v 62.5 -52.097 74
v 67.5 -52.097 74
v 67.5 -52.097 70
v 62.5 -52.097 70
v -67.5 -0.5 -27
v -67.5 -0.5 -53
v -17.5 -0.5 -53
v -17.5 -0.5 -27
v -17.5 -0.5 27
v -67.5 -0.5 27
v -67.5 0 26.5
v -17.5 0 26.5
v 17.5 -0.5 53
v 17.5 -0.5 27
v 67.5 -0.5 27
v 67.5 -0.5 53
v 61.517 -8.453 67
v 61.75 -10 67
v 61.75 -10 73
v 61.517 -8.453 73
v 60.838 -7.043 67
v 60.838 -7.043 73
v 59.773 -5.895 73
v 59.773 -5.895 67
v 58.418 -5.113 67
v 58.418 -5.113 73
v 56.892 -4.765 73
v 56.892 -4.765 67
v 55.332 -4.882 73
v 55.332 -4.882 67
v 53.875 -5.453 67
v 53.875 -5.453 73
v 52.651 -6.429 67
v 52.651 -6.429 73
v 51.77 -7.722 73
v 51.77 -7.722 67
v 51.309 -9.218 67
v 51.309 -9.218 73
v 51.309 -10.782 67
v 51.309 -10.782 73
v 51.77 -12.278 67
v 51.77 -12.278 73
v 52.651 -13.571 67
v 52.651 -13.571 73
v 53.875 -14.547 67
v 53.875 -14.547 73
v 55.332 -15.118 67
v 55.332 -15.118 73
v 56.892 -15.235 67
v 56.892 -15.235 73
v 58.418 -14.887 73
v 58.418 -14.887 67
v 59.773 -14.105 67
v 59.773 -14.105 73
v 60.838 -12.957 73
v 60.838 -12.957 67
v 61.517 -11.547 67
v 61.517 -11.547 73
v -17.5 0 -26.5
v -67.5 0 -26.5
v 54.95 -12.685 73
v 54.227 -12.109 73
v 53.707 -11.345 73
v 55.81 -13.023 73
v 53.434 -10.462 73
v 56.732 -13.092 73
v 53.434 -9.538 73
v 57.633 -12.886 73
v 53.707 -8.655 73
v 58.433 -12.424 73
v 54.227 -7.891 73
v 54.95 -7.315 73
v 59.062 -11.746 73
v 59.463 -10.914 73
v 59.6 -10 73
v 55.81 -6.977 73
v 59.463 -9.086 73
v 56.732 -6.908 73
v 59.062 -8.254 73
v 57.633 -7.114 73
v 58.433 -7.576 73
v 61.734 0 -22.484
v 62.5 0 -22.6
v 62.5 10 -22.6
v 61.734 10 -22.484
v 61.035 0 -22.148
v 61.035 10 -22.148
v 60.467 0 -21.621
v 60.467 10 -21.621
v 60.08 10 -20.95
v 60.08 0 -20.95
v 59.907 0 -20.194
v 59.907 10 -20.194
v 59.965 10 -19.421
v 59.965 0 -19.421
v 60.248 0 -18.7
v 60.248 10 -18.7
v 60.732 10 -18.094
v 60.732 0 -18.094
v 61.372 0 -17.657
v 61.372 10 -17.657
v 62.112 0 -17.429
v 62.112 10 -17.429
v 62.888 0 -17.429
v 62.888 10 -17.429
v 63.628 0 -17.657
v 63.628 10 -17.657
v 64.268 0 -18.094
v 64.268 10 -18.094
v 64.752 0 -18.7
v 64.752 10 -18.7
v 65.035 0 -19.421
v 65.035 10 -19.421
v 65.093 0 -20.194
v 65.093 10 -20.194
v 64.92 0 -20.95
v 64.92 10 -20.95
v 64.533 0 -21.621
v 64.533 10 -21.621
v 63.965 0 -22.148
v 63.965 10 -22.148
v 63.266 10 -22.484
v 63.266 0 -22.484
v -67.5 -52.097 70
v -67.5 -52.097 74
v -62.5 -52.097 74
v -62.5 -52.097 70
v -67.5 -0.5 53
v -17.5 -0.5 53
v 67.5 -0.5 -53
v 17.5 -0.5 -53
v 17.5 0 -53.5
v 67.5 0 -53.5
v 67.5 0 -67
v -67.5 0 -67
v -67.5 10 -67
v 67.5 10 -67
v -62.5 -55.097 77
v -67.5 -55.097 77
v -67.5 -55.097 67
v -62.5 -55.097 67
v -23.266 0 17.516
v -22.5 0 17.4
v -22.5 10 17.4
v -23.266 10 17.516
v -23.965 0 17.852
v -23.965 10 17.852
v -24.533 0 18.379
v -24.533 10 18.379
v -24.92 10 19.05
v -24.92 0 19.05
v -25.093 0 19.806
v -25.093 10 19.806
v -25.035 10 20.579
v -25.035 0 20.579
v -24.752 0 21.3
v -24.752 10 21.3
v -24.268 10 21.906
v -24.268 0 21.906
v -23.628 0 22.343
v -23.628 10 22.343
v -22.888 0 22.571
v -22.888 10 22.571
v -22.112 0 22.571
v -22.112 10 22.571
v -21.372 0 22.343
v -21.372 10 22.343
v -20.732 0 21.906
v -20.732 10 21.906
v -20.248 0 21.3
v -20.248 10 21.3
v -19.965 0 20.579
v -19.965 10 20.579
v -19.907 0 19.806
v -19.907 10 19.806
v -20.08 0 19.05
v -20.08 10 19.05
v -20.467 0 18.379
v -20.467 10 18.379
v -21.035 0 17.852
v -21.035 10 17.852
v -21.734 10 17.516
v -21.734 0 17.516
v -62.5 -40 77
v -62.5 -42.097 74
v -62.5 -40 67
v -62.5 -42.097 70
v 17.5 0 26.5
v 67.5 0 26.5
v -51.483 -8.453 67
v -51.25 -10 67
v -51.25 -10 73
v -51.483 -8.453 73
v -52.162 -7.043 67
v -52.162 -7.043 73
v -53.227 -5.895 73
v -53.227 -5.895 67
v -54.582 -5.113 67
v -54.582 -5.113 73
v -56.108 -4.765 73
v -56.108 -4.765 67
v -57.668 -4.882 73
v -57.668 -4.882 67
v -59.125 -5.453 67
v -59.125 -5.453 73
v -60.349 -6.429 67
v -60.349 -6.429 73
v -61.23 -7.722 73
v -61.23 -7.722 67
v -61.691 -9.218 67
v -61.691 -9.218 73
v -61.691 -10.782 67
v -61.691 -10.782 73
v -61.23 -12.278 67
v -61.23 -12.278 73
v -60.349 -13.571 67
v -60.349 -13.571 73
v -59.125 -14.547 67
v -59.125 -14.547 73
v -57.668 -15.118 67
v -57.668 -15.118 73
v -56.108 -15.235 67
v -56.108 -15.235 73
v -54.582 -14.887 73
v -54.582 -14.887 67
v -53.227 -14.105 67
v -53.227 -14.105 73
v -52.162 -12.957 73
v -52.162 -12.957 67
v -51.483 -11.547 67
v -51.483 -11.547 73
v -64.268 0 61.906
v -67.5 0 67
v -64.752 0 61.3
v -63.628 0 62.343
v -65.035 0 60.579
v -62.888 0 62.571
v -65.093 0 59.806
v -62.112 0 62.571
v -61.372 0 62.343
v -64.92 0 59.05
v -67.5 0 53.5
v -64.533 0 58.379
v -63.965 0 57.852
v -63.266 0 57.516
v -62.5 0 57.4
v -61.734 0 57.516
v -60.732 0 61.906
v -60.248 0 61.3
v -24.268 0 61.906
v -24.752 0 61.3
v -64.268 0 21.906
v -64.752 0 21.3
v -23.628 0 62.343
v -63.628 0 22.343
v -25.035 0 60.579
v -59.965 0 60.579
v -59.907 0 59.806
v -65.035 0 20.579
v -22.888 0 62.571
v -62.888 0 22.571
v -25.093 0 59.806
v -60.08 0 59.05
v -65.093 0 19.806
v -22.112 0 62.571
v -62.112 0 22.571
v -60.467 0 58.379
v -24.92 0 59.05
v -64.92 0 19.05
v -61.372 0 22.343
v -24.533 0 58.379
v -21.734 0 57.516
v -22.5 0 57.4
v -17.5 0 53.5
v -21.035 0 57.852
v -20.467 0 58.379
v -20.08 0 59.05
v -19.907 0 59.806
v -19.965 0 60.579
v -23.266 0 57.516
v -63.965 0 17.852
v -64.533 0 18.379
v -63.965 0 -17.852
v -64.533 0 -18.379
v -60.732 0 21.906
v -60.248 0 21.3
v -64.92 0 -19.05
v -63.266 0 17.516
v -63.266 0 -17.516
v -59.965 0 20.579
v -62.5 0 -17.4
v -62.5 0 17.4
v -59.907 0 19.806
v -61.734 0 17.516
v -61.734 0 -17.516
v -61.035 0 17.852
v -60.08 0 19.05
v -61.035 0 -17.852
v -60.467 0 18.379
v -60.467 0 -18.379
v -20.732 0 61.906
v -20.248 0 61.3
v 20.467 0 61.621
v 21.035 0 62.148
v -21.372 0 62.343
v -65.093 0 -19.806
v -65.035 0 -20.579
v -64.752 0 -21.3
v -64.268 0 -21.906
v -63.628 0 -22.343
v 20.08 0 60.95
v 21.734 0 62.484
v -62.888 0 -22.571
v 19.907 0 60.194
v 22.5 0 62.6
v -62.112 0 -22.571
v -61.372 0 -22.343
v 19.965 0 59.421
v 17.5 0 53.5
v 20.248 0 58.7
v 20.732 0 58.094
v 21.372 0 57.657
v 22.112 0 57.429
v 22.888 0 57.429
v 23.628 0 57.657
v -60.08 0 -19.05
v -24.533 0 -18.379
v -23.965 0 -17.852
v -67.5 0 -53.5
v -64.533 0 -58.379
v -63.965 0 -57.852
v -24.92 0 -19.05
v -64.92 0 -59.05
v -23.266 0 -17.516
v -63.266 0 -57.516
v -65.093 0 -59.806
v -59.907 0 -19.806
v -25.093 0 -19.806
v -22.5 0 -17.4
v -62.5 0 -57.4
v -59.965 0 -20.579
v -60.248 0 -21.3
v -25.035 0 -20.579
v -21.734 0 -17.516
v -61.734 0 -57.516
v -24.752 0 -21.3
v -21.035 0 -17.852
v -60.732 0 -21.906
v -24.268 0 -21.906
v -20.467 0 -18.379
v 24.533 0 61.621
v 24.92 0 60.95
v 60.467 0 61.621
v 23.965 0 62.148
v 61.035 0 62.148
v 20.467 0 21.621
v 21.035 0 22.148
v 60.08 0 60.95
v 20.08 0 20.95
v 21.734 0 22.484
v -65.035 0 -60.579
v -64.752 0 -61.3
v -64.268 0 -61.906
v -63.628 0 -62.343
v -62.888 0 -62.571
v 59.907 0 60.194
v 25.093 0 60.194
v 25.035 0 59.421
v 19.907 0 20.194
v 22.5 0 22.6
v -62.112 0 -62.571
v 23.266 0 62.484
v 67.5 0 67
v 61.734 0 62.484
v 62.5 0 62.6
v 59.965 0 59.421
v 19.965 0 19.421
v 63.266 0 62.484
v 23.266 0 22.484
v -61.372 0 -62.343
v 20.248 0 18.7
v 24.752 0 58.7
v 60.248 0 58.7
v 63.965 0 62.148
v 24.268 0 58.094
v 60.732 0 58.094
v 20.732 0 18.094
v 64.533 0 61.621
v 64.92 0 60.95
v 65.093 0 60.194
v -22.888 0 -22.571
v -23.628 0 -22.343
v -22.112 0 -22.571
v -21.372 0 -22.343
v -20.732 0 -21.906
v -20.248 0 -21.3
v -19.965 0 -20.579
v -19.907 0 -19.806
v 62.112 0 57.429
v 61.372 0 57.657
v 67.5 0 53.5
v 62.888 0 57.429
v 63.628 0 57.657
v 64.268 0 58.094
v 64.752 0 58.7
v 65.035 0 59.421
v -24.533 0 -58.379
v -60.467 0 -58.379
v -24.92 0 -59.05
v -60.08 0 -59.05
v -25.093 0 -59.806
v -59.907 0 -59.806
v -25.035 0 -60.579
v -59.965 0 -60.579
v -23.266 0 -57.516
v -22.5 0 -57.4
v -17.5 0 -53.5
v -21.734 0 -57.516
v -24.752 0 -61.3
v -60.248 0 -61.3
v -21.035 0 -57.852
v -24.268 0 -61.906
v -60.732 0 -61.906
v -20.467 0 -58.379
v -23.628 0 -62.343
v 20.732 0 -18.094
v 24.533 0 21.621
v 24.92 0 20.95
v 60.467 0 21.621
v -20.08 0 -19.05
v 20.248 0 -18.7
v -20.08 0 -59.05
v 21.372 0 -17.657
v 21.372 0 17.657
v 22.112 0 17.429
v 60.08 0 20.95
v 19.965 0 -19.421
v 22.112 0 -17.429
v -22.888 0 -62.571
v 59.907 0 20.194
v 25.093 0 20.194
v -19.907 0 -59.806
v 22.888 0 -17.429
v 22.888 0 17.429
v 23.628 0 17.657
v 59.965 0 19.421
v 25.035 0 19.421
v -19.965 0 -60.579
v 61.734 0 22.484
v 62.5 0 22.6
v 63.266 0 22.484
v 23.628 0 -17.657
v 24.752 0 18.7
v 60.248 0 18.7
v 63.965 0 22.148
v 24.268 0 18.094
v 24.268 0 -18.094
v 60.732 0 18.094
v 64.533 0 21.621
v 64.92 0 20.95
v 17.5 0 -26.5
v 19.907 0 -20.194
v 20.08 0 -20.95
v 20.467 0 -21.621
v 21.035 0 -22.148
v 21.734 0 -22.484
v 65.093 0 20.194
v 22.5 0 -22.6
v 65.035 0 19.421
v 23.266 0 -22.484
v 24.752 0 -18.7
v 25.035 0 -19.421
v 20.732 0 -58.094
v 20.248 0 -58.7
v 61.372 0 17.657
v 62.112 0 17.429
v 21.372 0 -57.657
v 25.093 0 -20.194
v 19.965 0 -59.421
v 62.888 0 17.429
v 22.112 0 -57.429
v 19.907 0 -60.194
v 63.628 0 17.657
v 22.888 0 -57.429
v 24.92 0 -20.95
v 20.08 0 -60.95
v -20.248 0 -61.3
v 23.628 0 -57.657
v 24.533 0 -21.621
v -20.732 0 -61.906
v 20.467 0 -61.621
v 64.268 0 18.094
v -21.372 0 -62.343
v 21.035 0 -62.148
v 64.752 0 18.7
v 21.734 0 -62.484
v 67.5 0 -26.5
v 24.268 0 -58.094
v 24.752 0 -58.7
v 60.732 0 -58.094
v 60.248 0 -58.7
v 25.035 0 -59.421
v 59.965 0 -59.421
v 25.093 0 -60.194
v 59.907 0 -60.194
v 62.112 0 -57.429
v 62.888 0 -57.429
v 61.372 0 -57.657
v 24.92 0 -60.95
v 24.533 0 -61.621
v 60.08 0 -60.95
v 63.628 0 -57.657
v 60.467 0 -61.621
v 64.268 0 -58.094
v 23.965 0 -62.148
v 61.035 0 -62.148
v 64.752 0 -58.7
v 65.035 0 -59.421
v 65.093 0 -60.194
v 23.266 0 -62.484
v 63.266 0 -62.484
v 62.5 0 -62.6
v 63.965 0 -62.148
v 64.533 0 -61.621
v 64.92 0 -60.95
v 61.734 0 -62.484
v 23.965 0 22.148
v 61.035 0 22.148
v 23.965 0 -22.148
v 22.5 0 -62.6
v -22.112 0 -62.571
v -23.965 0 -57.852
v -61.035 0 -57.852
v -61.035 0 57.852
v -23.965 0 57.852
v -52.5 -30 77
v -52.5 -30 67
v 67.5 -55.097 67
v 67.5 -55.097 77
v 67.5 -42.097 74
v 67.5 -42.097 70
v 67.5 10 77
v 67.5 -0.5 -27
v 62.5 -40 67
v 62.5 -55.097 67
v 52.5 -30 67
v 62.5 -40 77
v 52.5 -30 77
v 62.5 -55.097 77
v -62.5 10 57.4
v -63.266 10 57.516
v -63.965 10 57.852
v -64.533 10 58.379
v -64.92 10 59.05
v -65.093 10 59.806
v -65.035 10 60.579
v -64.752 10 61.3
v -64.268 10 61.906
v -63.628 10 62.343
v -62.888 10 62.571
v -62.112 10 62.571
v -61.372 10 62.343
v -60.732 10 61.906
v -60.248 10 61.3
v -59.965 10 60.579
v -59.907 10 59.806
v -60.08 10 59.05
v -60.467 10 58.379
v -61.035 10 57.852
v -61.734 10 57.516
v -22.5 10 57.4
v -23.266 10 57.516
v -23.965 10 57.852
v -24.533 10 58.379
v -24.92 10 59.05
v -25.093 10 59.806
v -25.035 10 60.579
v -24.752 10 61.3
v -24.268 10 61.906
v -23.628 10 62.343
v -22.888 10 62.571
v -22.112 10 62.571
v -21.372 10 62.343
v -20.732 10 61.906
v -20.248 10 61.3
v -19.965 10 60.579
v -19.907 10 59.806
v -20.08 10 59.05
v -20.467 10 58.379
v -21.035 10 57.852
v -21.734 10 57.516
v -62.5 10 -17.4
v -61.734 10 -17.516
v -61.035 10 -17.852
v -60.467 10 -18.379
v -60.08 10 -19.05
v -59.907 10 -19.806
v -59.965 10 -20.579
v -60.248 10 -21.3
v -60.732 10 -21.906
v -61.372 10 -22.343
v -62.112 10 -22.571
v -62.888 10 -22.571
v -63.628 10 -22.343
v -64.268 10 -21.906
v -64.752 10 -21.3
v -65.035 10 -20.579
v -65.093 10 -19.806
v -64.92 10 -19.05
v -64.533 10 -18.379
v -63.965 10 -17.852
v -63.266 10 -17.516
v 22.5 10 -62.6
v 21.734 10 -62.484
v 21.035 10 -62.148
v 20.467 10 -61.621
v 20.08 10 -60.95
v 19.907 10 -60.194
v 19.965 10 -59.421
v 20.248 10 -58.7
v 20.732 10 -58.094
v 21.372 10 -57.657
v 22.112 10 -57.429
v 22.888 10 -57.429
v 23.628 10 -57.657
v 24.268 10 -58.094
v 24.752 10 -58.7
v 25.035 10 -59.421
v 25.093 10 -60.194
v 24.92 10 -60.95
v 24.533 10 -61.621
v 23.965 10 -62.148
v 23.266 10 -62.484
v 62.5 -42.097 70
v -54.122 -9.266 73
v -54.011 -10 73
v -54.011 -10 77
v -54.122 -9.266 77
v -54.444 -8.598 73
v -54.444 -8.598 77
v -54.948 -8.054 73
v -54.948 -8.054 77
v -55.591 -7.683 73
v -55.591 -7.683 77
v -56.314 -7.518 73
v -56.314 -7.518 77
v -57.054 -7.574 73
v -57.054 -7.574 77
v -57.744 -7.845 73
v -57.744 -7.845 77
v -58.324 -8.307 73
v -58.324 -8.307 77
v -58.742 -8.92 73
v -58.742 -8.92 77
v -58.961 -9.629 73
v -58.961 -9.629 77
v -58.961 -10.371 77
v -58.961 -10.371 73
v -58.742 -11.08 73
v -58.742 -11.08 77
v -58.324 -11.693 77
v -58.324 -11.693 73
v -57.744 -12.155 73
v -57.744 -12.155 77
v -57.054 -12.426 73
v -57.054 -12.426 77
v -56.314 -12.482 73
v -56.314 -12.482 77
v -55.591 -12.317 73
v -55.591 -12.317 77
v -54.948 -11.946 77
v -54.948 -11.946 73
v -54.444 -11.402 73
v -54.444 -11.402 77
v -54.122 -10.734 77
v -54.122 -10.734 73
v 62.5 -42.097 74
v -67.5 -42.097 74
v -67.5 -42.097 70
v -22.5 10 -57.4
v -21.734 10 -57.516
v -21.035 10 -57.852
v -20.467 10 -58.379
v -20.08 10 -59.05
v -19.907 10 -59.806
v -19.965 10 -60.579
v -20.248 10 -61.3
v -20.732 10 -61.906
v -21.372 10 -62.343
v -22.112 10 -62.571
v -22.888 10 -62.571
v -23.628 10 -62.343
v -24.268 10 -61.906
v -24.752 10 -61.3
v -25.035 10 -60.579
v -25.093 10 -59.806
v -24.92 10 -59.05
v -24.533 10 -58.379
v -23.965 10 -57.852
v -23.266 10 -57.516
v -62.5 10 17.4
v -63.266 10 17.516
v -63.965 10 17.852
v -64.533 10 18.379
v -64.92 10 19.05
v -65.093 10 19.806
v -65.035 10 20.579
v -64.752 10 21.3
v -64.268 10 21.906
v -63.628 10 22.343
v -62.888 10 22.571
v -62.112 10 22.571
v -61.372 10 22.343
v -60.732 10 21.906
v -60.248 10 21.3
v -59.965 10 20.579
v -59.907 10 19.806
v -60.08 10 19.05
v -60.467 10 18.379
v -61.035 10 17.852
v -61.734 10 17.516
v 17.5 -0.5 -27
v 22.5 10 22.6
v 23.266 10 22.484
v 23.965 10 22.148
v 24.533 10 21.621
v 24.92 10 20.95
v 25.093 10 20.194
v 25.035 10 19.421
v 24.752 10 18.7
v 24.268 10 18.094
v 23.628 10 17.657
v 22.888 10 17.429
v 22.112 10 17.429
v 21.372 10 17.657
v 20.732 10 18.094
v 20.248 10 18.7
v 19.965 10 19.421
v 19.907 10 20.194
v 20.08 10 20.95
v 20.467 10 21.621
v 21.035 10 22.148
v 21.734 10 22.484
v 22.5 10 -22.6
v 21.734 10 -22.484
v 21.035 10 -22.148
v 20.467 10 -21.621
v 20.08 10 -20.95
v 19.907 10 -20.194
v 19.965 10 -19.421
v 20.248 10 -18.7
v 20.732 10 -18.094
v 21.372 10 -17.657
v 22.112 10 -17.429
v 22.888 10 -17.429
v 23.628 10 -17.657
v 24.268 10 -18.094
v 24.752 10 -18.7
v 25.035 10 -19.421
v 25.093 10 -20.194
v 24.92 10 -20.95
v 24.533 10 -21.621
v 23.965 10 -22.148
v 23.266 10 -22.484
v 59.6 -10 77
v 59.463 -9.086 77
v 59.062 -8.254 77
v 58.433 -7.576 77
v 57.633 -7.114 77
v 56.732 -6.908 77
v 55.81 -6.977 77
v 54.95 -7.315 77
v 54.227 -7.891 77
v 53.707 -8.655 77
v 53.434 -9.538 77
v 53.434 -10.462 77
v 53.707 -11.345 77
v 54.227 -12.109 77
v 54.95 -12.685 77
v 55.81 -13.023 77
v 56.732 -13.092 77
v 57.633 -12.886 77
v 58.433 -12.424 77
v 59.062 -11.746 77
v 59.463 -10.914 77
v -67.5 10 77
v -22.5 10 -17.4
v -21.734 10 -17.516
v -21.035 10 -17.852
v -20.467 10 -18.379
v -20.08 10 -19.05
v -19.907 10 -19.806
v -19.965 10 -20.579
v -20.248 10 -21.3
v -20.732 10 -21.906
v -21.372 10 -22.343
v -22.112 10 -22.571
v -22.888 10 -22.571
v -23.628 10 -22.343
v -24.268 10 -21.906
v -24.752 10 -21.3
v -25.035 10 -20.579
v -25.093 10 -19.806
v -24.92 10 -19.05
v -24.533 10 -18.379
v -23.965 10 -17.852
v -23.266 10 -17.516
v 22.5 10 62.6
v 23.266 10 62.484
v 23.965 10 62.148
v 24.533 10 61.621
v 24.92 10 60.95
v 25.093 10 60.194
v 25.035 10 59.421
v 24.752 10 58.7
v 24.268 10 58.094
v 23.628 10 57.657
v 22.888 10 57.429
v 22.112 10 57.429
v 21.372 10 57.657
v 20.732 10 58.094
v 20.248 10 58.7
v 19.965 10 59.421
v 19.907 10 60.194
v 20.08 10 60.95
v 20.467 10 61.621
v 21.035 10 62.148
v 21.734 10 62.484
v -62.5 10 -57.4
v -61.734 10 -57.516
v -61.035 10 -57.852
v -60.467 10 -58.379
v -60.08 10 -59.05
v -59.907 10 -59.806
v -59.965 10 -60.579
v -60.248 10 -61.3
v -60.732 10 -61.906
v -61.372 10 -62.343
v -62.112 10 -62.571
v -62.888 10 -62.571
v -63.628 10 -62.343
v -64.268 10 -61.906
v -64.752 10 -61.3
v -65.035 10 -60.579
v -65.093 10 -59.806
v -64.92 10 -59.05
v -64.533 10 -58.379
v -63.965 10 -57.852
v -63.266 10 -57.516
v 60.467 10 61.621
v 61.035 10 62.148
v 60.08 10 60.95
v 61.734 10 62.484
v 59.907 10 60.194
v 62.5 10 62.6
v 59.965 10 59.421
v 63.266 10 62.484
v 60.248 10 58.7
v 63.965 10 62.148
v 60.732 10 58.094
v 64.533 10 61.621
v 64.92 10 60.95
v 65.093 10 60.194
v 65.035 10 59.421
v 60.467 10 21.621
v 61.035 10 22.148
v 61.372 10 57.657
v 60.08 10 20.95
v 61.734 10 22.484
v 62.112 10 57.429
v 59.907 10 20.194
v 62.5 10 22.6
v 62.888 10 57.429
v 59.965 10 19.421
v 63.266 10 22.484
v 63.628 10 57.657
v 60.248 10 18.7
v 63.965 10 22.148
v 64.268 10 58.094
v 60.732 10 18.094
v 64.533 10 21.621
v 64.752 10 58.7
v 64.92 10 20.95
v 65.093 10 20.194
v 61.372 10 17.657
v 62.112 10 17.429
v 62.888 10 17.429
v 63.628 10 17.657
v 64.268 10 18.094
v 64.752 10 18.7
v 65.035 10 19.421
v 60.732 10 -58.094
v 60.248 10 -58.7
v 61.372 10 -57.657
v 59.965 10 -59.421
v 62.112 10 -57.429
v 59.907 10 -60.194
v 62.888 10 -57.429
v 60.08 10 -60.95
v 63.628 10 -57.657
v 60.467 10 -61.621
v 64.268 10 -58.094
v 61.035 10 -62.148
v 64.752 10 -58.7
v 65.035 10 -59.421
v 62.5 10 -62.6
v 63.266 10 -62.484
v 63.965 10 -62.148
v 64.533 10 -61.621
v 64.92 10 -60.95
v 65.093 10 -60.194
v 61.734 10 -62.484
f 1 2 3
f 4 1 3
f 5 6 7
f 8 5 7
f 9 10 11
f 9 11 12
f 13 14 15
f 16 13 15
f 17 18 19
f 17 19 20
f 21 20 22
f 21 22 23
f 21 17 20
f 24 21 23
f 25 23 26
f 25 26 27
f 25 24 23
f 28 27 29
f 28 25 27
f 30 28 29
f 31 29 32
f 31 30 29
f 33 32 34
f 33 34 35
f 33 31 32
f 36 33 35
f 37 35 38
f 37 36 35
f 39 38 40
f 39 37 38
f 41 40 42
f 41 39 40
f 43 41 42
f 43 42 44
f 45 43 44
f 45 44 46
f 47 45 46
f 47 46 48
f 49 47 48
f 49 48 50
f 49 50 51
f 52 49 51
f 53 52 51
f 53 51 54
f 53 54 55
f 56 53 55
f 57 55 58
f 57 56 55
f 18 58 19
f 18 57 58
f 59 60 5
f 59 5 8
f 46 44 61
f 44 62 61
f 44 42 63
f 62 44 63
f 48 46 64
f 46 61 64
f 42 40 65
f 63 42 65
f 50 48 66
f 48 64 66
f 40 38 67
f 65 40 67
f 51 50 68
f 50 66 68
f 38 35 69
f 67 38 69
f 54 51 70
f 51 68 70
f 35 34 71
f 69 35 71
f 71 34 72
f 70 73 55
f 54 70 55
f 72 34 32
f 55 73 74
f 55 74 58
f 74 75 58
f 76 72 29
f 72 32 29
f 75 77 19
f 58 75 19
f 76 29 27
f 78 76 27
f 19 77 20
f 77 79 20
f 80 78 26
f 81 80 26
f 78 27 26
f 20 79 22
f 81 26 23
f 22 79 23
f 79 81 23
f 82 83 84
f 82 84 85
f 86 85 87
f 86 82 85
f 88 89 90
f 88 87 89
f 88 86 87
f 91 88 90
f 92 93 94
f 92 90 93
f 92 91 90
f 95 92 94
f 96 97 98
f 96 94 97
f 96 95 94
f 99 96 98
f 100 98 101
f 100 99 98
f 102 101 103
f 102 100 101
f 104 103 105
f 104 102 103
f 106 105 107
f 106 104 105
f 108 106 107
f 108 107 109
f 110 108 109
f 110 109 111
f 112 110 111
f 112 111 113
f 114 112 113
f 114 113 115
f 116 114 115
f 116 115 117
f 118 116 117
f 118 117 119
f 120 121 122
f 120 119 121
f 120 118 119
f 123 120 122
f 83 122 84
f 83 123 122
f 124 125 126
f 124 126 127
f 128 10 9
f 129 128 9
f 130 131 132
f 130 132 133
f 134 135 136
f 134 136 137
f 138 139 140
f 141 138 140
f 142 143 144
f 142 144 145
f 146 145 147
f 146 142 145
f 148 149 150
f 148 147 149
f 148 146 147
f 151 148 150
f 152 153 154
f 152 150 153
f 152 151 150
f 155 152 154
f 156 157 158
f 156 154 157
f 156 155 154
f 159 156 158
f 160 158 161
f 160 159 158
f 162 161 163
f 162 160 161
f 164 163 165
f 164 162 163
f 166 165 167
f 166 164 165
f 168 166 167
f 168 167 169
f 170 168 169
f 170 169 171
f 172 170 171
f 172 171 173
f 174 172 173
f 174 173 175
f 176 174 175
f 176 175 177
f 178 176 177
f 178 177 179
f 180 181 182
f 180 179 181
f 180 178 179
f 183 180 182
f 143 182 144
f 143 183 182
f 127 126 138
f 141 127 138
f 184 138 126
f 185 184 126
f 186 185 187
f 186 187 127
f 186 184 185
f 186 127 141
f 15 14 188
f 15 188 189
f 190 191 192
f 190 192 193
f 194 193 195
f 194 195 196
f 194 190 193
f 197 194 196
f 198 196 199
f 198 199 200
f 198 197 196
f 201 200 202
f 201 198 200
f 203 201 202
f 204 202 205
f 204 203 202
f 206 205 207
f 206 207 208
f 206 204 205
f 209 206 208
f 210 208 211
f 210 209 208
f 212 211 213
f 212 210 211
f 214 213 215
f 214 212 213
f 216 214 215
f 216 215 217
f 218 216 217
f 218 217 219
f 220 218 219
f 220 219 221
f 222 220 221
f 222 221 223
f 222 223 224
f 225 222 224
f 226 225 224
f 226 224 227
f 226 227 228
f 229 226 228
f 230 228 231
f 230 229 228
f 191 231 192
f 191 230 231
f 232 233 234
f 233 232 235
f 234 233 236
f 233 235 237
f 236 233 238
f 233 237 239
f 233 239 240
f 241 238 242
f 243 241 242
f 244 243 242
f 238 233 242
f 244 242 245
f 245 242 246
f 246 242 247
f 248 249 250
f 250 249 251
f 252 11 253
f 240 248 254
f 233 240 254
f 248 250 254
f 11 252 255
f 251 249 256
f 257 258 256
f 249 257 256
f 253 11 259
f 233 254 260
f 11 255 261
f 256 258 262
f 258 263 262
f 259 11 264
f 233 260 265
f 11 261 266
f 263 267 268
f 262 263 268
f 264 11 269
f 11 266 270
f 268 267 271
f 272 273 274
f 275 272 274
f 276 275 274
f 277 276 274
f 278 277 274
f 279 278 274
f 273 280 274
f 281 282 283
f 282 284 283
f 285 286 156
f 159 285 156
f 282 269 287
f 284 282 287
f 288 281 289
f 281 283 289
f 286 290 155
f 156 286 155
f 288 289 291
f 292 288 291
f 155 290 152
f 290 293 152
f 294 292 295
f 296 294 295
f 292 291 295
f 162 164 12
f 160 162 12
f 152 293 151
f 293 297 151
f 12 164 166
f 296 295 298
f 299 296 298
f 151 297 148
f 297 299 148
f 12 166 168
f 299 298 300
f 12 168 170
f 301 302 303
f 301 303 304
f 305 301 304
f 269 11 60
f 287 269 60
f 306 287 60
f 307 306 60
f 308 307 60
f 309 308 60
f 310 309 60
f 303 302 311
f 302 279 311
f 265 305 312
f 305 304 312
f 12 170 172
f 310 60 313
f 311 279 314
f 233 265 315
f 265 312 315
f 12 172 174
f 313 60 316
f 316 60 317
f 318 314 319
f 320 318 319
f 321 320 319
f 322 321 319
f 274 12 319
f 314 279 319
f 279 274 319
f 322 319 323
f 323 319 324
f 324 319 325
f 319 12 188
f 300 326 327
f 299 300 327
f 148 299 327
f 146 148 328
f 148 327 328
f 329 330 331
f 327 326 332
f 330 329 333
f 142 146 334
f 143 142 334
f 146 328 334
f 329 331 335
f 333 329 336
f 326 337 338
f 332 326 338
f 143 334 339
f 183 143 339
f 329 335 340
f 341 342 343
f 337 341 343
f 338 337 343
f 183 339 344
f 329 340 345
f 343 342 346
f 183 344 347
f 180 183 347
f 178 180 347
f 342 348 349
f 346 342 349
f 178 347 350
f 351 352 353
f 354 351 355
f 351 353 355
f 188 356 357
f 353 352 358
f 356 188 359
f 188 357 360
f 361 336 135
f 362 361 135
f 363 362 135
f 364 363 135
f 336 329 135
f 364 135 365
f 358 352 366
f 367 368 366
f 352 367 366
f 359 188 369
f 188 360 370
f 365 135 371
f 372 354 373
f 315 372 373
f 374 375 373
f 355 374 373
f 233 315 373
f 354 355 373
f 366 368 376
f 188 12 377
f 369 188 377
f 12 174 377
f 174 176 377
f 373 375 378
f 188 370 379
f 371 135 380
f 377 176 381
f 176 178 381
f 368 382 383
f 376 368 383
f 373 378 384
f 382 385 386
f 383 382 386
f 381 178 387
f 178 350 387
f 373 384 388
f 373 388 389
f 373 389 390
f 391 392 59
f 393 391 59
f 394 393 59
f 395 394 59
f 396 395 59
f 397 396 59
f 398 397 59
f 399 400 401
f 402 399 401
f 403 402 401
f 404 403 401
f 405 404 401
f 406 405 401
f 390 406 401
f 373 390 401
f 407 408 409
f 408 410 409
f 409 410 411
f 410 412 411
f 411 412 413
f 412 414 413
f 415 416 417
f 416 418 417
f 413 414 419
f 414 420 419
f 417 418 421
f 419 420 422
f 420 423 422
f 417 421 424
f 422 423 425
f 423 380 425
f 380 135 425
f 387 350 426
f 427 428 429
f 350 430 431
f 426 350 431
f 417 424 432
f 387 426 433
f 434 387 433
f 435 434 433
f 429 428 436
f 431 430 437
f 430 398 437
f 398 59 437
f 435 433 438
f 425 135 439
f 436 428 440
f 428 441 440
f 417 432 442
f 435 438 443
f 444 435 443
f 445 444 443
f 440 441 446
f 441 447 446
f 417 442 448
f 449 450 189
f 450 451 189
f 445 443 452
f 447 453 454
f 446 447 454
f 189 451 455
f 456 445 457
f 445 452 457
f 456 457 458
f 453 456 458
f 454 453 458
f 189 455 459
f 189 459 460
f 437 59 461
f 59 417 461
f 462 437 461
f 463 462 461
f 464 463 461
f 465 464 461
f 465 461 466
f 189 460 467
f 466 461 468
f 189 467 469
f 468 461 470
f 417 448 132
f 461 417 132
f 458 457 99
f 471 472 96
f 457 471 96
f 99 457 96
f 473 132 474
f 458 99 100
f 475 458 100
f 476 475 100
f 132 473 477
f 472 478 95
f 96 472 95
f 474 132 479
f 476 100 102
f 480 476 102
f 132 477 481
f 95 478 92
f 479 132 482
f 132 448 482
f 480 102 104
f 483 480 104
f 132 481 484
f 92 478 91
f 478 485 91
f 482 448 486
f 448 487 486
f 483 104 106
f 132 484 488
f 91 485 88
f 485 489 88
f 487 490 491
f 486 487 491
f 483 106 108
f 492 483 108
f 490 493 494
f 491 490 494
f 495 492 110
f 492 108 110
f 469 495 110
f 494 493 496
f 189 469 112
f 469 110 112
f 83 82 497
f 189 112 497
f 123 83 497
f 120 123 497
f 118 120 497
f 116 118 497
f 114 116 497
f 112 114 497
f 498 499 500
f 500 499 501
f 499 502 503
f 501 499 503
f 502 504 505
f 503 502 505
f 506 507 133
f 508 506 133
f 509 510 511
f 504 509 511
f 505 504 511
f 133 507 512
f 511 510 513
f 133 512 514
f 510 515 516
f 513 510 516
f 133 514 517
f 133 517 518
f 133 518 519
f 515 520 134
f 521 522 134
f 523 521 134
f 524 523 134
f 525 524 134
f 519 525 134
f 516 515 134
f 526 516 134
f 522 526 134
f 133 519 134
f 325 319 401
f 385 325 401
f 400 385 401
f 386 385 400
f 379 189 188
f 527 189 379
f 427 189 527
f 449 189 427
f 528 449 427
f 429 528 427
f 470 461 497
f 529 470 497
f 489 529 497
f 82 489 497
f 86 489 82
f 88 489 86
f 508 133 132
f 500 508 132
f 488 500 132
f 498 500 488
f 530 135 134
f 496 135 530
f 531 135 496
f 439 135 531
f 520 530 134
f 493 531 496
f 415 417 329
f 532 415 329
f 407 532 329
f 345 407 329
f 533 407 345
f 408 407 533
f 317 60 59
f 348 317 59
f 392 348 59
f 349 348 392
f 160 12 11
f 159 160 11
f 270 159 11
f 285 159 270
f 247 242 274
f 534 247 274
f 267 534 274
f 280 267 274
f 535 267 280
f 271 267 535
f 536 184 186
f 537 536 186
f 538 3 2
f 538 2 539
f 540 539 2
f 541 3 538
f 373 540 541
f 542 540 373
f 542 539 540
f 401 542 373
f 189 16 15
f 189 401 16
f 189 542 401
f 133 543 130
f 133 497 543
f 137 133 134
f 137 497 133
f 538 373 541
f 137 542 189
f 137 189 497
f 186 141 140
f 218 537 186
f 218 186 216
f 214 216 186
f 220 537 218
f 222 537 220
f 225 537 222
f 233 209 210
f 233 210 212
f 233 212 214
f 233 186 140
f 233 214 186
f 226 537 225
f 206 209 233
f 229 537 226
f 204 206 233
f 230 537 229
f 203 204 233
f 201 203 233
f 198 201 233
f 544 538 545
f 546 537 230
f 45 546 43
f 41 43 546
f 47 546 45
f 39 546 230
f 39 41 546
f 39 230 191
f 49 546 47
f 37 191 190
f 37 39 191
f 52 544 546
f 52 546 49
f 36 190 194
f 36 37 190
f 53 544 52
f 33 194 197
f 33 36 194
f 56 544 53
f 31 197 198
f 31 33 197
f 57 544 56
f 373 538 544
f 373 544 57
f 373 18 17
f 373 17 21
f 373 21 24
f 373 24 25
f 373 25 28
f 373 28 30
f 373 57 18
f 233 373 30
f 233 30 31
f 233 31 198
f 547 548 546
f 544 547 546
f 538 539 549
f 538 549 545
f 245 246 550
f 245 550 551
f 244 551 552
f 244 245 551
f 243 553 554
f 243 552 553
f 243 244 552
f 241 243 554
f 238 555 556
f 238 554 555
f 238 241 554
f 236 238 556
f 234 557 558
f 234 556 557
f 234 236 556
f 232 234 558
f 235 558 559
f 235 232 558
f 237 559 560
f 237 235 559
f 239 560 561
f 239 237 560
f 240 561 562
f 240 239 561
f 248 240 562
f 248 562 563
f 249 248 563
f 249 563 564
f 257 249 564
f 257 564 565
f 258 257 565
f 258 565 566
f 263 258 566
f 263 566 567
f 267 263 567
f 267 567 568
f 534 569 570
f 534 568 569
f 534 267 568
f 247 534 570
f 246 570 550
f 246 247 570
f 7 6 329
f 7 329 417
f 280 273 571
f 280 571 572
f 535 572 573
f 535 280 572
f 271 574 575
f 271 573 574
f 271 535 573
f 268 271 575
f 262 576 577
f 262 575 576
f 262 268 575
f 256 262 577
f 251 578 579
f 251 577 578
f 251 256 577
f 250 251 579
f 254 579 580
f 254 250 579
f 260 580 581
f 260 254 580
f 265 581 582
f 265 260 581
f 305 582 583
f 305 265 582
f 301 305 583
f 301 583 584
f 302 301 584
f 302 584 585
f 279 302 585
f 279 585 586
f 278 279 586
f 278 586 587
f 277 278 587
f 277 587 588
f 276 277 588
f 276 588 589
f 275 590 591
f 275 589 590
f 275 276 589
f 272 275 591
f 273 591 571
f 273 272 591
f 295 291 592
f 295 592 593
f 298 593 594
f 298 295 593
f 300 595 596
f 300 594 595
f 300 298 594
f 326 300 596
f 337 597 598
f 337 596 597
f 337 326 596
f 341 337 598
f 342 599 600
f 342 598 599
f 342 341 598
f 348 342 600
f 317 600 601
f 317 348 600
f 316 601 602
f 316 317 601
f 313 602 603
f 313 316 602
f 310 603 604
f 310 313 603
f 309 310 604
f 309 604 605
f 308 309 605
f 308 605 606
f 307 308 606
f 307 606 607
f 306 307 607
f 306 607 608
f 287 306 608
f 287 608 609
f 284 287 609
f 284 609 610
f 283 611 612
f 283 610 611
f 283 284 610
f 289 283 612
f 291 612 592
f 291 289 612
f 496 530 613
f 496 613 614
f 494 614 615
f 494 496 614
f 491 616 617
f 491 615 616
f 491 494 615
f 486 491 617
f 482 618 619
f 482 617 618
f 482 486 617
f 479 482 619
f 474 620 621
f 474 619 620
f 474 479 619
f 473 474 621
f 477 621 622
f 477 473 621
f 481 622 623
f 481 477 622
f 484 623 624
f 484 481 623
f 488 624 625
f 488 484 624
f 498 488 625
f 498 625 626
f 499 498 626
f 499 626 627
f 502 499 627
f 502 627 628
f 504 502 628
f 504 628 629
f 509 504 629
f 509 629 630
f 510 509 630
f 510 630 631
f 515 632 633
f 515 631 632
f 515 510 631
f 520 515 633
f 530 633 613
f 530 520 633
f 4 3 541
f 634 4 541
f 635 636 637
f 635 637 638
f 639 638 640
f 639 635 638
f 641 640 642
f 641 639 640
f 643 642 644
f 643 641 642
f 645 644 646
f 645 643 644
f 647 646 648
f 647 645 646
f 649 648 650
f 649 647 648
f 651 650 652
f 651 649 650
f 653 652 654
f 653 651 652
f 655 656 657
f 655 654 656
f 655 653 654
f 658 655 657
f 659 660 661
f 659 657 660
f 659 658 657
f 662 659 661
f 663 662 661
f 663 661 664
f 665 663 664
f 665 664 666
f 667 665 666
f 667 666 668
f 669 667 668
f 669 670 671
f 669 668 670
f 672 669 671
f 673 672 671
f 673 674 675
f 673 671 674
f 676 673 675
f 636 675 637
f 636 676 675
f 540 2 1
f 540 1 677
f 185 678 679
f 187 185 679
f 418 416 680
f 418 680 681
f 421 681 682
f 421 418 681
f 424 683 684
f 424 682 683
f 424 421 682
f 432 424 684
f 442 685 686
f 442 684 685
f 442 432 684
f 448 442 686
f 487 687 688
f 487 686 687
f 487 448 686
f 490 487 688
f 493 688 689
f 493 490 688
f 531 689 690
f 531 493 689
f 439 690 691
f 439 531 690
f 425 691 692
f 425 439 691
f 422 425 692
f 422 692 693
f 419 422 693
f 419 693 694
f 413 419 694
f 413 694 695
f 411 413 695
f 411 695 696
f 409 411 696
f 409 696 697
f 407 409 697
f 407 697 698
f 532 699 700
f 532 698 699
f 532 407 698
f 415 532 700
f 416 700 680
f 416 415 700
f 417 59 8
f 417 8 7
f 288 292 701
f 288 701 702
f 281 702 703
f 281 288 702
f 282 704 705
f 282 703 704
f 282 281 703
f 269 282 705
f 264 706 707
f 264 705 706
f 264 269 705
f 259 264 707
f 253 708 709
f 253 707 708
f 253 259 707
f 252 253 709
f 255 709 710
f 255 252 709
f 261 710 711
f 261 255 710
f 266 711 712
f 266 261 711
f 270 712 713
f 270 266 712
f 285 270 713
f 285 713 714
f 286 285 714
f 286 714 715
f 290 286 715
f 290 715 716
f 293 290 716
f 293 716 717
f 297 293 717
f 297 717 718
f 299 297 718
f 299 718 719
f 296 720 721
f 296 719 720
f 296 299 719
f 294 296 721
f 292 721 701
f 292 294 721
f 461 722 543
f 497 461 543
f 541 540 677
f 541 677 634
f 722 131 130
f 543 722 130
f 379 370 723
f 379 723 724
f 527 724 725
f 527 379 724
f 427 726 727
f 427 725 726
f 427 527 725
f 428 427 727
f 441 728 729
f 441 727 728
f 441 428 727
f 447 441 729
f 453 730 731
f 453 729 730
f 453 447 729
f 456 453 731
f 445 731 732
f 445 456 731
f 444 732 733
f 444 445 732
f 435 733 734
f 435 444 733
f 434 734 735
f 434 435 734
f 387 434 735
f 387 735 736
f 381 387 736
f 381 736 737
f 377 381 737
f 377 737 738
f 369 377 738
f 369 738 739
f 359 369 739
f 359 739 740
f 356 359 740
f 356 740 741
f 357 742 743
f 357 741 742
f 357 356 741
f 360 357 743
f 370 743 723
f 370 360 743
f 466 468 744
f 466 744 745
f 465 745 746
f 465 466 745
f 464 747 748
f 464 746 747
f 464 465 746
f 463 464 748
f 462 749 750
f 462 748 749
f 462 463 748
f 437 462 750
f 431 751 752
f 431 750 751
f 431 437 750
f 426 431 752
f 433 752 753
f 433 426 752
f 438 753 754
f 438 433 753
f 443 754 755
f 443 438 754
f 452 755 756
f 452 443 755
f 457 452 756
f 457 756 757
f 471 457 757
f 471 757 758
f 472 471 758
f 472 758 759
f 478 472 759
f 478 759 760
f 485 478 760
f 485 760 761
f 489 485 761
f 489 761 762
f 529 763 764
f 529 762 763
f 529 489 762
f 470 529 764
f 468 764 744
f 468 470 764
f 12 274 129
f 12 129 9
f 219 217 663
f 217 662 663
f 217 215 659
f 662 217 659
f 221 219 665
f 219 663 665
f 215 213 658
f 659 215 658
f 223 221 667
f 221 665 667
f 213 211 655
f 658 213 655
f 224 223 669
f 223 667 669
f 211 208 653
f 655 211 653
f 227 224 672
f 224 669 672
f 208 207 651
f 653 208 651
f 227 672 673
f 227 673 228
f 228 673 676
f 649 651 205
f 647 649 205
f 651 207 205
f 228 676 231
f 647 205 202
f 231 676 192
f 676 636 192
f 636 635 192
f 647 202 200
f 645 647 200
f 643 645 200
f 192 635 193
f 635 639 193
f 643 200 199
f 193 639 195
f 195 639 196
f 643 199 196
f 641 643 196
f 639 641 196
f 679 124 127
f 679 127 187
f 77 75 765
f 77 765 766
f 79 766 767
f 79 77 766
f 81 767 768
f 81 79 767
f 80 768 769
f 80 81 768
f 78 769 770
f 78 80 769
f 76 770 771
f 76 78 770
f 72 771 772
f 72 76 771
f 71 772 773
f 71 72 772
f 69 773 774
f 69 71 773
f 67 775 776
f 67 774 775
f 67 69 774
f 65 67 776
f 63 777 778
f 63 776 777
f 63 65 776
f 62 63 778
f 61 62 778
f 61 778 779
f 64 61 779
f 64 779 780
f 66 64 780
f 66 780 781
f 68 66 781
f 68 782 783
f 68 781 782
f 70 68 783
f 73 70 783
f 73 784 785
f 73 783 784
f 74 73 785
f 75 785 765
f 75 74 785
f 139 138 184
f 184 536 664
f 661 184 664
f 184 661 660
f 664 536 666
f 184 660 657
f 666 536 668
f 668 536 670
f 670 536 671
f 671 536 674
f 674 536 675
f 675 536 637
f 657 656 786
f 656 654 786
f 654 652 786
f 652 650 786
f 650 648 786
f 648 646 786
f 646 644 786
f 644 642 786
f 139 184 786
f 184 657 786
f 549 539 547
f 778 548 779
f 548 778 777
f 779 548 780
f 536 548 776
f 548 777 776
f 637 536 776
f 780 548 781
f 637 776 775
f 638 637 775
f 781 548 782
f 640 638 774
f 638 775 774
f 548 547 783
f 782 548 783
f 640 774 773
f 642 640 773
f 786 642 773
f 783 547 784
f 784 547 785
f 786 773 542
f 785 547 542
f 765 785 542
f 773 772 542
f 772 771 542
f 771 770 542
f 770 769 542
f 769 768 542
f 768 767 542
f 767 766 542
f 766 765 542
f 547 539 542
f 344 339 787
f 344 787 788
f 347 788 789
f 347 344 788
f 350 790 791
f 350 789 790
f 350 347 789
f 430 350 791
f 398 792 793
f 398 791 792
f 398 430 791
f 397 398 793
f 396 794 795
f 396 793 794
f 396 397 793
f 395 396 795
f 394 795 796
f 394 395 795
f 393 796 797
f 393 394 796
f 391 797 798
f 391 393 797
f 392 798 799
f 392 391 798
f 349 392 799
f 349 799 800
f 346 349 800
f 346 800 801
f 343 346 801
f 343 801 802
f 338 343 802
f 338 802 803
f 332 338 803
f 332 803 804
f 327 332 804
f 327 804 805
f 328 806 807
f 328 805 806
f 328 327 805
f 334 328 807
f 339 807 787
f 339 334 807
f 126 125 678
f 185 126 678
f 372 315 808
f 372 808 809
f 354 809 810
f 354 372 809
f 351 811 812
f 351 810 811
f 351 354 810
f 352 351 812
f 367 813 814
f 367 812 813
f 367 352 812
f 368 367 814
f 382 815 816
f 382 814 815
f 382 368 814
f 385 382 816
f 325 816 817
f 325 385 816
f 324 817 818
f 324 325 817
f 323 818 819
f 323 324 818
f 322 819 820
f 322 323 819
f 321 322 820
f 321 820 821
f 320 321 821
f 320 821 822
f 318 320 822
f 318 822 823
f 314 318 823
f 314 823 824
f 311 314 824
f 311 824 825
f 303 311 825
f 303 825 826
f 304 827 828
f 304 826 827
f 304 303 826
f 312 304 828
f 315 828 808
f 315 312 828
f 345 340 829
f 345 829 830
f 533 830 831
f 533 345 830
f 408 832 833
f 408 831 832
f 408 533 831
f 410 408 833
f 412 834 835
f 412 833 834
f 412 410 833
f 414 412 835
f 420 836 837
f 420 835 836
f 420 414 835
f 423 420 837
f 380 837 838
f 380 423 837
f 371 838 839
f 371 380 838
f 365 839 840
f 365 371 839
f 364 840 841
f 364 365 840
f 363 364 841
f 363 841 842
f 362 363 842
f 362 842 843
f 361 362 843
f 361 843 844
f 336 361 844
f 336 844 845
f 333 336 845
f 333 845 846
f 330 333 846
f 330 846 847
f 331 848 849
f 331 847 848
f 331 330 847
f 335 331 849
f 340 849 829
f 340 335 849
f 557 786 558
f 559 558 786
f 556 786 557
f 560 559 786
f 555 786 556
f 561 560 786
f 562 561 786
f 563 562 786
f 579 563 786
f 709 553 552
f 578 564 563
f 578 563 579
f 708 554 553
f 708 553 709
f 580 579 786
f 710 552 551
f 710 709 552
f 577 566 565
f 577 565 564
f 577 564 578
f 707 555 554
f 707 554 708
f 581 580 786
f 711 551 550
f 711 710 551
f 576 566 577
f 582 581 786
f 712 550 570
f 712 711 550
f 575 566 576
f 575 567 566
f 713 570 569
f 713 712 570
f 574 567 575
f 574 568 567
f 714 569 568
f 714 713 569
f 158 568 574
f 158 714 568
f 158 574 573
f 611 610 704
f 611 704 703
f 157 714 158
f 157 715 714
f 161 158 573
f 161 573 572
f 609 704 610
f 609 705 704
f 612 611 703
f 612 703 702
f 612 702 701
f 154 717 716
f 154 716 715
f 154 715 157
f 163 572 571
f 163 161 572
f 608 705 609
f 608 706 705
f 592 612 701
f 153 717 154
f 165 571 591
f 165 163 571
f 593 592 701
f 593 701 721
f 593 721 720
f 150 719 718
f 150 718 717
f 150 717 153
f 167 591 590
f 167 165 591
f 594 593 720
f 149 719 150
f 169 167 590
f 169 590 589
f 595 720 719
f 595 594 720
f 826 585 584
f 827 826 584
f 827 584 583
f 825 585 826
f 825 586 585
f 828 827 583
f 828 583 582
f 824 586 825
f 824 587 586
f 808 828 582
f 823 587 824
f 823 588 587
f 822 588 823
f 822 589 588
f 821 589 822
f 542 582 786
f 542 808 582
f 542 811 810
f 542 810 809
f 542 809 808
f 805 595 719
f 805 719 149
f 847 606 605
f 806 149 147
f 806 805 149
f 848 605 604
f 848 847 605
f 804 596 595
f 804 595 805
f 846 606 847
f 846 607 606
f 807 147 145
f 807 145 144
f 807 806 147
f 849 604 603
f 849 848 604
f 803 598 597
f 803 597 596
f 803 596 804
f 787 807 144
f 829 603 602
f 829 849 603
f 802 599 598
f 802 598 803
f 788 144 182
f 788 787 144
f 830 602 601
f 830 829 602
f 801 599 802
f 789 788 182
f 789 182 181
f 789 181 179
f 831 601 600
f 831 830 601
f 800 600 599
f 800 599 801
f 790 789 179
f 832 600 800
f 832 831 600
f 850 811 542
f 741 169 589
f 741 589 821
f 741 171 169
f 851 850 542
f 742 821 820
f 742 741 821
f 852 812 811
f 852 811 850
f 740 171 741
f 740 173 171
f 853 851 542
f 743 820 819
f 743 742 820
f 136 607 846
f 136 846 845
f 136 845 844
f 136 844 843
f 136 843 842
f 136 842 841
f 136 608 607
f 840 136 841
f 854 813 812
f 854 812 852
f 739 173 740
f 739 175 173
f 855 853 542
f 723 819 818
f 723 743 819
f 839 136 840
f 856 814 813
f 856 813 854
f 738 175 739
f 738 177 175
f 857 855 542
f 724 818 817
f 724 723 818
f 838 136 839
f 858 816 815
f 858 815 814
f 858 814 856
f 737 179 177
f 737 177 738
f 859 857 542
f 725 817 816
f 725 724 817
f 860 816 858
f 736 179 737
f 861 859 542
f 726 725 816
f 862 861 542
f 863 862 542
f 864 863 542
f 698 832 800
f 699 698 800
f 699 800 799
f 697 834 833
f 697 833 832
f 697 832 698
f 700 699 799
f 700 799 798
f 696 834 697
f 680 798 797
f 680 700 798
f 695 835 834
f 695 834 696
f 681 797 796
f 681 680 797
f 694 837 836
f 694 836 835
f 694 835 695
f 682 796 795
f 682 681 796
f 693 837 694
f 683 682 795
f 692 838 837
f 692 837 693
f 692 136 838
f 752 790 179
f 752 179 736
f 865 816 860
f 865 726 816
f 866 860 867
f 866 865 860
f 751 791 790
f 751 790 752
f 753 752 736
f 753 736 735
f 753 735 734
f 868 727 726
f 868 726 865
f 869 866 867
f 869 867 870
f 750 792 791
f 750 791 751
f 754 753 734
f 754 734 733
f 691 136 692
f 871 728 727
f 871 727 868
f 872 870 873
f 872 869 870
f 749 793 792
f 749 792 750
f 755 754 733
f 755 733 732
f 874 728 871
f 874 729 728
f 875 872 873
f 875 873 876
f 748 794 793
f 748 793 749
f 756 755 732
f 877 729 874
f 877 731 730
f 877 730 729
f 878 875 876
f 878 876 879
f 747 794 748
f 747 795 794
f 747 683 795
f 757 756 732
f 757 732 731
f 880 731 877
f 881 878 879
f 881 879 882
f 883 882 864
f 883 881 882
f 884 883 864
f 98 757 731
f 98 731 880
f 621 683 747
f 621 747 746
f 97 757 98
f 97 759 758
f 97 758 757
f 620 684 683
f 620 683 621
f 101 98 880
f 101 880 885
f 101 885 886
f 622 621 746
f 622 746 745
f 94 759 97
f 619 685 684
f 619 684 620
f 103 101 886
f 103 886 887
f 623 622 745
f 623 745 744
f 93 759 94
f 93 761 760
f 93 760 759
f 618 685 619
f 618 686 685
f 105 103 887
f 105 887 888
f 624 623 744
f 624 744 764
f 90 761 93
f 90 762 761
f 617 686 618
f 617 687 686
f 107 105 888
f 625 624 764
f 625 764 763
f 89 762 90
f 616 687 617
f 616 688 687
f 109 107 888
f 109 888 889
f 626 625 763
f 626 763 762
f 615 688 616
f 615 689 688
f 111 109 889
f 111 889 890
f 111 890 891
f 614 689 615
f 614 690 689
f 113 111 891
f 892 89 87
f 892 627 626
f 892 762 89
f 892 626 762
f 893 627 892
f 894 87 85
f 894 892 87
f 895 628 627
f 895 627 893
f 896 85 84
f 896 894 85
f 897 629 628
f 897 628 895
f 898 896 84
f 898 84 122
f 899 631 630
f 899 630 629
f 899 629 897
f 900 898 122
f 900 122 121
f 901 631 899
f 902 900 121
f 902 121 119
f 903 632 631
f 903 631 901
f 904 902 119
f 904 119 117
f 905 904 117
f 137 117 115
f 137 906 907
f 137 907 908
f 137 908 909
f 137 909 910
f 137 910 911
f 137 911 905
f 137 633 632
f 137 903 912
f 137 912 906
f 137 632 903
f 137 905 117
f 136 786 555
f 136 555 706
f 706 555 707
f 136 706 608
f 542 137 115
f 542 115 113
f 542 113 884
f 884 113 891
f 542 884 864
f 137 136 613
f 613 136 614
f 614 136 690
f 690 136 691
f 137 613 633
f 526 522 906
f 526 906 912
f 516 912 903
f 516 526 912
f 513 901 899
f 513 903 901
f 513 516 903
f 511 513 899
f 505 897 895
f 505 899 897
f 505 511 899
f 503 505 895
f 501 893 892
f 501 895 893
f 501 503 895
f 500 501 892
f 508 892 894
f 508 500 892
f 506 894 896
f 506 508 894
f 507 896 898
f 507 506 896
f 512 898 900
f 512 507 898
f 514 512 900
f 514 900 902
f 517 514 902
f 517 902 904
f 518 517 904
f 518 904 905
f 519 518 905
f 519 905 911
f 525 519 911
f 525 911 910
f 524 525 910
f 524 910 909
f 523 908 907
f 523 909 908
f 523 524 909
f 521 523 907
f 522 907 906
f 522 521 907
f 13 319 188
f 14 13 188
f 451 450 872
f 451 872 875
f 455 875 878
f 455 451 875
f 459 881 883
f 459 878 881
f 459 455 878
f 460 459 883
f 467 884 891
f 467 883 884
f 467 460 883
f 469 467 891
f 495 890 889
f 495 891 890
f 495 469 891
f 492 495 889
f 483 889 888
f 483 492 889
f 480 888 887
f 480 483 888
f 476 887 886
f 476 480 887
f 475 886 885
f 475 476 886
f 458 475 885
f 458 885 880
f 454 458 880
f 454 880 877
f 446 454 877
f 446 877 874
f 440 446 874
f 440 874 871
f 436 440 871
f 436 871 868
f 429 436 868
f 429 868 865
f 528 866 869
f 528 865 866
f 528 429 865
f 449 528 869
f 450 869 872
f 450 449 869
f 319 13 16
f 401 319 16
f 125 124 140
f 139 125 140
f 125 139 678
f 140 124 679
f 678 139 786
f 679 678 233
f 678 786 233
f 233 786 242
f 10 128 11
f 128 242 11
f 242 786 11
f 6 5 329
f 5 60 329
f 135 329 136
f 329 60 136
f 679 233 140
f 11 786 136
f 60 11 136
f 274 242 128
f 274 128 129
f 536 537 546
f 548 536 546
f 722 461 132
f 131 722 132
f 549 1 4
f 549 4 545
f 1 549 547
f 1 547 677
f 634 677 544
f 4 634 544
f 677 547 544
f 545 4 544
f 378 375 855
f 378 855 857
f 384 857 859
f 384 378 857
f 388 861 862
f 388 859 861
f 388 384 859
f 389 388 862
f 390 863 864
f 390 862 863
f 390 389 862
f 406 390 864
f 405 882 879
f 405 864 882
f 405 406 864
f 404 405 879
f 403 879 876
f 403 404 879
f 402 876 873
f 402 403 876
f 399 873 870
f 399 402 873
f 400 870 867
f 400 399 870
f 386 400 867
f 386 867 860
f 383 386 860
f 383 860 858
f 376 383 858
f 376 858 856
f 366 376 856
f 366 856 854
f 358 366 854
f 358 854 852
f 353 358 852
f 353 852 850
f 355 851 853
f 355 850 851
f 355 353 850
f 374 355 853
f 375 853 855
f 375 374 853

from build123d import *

# Parameters (mm, degrees)
SKETCH1_W               = 135
SKETCH1_H               = 134
BOSS_EXTRUDE1_DEPTH     = 10
SKETCH2_W               = 50
SKETCH2_H               = 27
BOSS_EXTRUDE2_DEPTH     = 0.5
CUT_EXTRUDE1_DEPTH      = 96.630800478
CUT_EXTRUDE1_DEPTH_BACK = 96.630800478
SKETCH3_R               = 2.6
BOSS_EXTRUDE3_START     = 67
SKETCH4_W               = 135
SKETCH4_H               = 40
BOSS_EXTRUDE3_DEPTH     = 10
CUT_EXTRUDE2_DEPTH      = 107.701686959
CUT_EXTRUDE2_DEPTH_BACK = 184.701686959
CUT_EXTRUDE2_START      = 77
SKETCH5_R               = 2.488859202
SKETCH5_R_2             = 3.1003276
CHAMFER1_SIZE           = 0.5
CUT_EXTRUDE3_START      = 67
SKETCH6_R               = 5.25
CUT_EXTRUDE3_DEPTH      = 6
BOSS_EXTRUDE4_START     = -67.5
SKETCH7_W               = 10
SKETCH7_H               = 25.09735907
SKETCH7_W_2             = 4
SKETCH7_H_2             = 10
BOSS_EXTRUDE4_DEPTH     = 5
BOSS_EXTRUDE5_START     = 67.5
SKETCH7_2_W             = 10
SKETCH7_2_H             = 25.09735907
SKETCH7_2_W_2           = 4
SKETCH7_2_H_2           = 10
BOSS_EXTRUDE5_DEPTH     = 5
CHAMFER2_SIZE           = 10


with BuildPart() as part:
    # Sketch1 → Boss-Extrude1 (new body)
    with BuildSketch(Plane(origin=(0, 0, 0), x_dir=(1, 0, 0), z_dir=(0, 1, 0))):
        Rectangle(SKETCH1_W, SKETCH1_H)
    extrude(amount=BOSS_EXTRUDE1_DEPTH)

    # Sketch2 → Boss-Extrude2 (add)
    with BuildSketch(Plane(origin=(0, 0, 0), x_dir=(1, 0, 0), z_dir=(0, 1, 0))):
        with Locations((-42.5, 40)):
            Rectangle(SKETCH2_W, SKETCH2_H)
        with Locations((-42.5, -40)):
            Rectangle(SKETCH2_W, SKETCH2_H)
        with Locations((42.5, -40)):
            Rectangle(SKETCH2_W, SKETCH2_H)
        with Locations((42.5, 40)):
            Rectangle(SKETCH2_W, SKETCH2_H)
    extrude(amount=-BOSS_EXTRUDE2_DEPTH)

    # Sketch3 → Cut-Extrude1 (cut, two sides: drawn at the far end of the back side and taken through both)
    with BuildSketch(Plane(origin=(0, 0, 0), x_dir=(1, 0, 0), z_dir=(0, 1, 0)).offset(-CUT_EXTRUDE1_DEPTH_BACK)):
        with Locations(Location((-62.5, 20, 0), (0, 0, 270))):
            Circle(SKETCH3_R)
        with Locations(Location((-22.5, 20, 0), (0, 0, 270))):
            Circle(SKETCH3_R)
        with Locations(Location((-22.5, 60, 0), (0, 0, 270))):
            Circle(SKETCH3_R)
        with Locations(Location((-62.5, 60, 0), (0, 0, 270))):
            Circle(SKETCH3_R)
        with Locations(Location((-62.5, -60, 0), (0, 0, 90))):
            Circle(SKETCH3_R)
        with Locations(Location((-22.5, -60, 0), (0, 0, 90))):
            Circle(SKETCH3_R)
        with Locations(Location((-22.5, -20, 0), (0, 0, 90))):
            Circle(SKETCH3_R)
        with Locations(Location((-62.5, -20, 0), (0, 0, 90))):
            Circle(SKETCH3_R)
        with Locations(Location((62.5, -20, 0), (0, 0, 270))):
            Circle(SKETCH3_R)
        with Locations(Location((22.5, -20, 0), (0, 0, 270))):
            Circle(SKETCH3_R)
        with Locations(Location((22.5, -60, 0), (0, 0, 270))):
            Circle(SKETCH3_R)
        with Locations(Location((62.5, -60, 0), (0, 0, 270))):
            Circle(SKETCH3_R)
        with Locations(Location((62.5, 60, 0), (0, 0, 90))):
            Circle(SKETCH3_R)
        with Locations(Location((22.5, 60, 0), (0, 0, 90))):
            Circle(SKETCH3_R)
        with Locations(Location((22.5, 20, 0), (0, 0, 90))):
            Circle(SKETCH3_R)
        with Locations(Location((62.5, 20, 0), (0, 0, 90))):
            Circle(SKETCH3_R)
    extrude(amount=CUT_EXTRUDE1_DEPTH + CUT_EXTRUDE1_DEPTH_BACK, mode=Mode.SUBTRACT)

    # Sketch4 → Boss-Extrude3 (add)
    with BuildSketch(Plane.XY.offset(BOSS_EXTRUDE3_START)):
        with Locations((0, -10)):
            Rectangle(SKETCH4_W, SKETCH4_H)
    extrude(amount=BOSS_EXTRUDE3_DEPTH)

    # Sketch5 → Cut-Extrude2 (cut, two sides: drawn at the far end of the back side and taken through both)
    with BuildSketch(Plane.XY.offset(CUT_EXTRUDE2_START - CUT_EXTRUDE2_DEPTH_BACK)):
        with Locations((-56.5, -10)):
            Circle(SKETCH5_R)
        with Locations((56.5, -10)):
            Circle(SKETCH5_R_2)
    extrude(amount=CUT_EXTRUDE2_DEPTH + CUT_EXTRUDE2_DEPTH_BACK, mode=Mode.SUBTRACT)

    # Chamfer1
    chamfer1_edges = [part.edges().sort_by_distance(p)[0] for p in [
        (42.5, -0.5, 26.5),
        (42.5, -0.5, 53.5),
        (-42.5, -0.5, 53.5),
        (-42.5, -0.5, 26.5),
        (-42.5, -0.5, -53.5),
        (-42.5, -0.5, -26.5),
        (42.5, -0.5, -26.5),
        (42.5, -0.5, -53.5),
    ]]
    chamfer(chamfer1_edges, length=CHAMFER1_SIZE - 0.0001)  # a hair under: the kernel refuses the full size

    # Sketch6 → Cut-Extrude3 (cut)
    with BuildSketch(Plane.XY.offset(CUT_EXTRUDE3_START)):
        with Locations((56.5, -10)):
            Circle(SKETCH6_R)
        with Locations((-56.5, -10)):
            Circle(SKETCH6_R)
    extrude(amount=CUT_EXTRUDE3_DEPTH, mode=Mode.SUBTRACT)

    # Sketch7 → Boss-Extrude4 (add)
    with BuildSketch(Plane(origin=(0, 0, 0), x_dir=(0, 0, -1), z_dir=(1, 0, 0)).offset(BOSS_EXTRUDE4_START)):
        with Locations((-72, -42.548679535)):
            Rectangle(SKETCH7_W, SKETCH7_H)
        with Locations((-72, -47.09735907)):
            Rectangle(SKETCH7_W_2, SKETCH7_H_2, mode=Mode.SUBTRACT)
    extrude(amount=BOSS_EXTRUDE4_DEPTH)

    # Sketch7<2> → Boss-Extrude5 (add)
    with BuildSketch(Plane(origin=(0, 0, 0), x_dir=(0, 0, -1), z_dir=(1, 0, 0)).offset(BOSS_EXTRUDE5_START)):
        with Locations((-72, -42.548679535)):
            Rectangle(SKETCH7_2_W, SKETCH7_2_H)
        with Locations((-72, -47.09735907)):
            Rectangle(SKETCH7_2_W_2, SKETCH7_2_H_2, mode=Mode.SUBTRACT)
    extrude(amount=-BOSS_EXTRUDE5_DEPTH)

    # Chamfer2
    chamfer2_edges = [part.edges().sort_by_distance(p)[0] for p in [
        (-62.5, -30, 72),
        (62.5, -30, 72),
    ]]
    chamfer(chamfer2_edges, length=CHAMFER2_SIZE)


solid = part.part
